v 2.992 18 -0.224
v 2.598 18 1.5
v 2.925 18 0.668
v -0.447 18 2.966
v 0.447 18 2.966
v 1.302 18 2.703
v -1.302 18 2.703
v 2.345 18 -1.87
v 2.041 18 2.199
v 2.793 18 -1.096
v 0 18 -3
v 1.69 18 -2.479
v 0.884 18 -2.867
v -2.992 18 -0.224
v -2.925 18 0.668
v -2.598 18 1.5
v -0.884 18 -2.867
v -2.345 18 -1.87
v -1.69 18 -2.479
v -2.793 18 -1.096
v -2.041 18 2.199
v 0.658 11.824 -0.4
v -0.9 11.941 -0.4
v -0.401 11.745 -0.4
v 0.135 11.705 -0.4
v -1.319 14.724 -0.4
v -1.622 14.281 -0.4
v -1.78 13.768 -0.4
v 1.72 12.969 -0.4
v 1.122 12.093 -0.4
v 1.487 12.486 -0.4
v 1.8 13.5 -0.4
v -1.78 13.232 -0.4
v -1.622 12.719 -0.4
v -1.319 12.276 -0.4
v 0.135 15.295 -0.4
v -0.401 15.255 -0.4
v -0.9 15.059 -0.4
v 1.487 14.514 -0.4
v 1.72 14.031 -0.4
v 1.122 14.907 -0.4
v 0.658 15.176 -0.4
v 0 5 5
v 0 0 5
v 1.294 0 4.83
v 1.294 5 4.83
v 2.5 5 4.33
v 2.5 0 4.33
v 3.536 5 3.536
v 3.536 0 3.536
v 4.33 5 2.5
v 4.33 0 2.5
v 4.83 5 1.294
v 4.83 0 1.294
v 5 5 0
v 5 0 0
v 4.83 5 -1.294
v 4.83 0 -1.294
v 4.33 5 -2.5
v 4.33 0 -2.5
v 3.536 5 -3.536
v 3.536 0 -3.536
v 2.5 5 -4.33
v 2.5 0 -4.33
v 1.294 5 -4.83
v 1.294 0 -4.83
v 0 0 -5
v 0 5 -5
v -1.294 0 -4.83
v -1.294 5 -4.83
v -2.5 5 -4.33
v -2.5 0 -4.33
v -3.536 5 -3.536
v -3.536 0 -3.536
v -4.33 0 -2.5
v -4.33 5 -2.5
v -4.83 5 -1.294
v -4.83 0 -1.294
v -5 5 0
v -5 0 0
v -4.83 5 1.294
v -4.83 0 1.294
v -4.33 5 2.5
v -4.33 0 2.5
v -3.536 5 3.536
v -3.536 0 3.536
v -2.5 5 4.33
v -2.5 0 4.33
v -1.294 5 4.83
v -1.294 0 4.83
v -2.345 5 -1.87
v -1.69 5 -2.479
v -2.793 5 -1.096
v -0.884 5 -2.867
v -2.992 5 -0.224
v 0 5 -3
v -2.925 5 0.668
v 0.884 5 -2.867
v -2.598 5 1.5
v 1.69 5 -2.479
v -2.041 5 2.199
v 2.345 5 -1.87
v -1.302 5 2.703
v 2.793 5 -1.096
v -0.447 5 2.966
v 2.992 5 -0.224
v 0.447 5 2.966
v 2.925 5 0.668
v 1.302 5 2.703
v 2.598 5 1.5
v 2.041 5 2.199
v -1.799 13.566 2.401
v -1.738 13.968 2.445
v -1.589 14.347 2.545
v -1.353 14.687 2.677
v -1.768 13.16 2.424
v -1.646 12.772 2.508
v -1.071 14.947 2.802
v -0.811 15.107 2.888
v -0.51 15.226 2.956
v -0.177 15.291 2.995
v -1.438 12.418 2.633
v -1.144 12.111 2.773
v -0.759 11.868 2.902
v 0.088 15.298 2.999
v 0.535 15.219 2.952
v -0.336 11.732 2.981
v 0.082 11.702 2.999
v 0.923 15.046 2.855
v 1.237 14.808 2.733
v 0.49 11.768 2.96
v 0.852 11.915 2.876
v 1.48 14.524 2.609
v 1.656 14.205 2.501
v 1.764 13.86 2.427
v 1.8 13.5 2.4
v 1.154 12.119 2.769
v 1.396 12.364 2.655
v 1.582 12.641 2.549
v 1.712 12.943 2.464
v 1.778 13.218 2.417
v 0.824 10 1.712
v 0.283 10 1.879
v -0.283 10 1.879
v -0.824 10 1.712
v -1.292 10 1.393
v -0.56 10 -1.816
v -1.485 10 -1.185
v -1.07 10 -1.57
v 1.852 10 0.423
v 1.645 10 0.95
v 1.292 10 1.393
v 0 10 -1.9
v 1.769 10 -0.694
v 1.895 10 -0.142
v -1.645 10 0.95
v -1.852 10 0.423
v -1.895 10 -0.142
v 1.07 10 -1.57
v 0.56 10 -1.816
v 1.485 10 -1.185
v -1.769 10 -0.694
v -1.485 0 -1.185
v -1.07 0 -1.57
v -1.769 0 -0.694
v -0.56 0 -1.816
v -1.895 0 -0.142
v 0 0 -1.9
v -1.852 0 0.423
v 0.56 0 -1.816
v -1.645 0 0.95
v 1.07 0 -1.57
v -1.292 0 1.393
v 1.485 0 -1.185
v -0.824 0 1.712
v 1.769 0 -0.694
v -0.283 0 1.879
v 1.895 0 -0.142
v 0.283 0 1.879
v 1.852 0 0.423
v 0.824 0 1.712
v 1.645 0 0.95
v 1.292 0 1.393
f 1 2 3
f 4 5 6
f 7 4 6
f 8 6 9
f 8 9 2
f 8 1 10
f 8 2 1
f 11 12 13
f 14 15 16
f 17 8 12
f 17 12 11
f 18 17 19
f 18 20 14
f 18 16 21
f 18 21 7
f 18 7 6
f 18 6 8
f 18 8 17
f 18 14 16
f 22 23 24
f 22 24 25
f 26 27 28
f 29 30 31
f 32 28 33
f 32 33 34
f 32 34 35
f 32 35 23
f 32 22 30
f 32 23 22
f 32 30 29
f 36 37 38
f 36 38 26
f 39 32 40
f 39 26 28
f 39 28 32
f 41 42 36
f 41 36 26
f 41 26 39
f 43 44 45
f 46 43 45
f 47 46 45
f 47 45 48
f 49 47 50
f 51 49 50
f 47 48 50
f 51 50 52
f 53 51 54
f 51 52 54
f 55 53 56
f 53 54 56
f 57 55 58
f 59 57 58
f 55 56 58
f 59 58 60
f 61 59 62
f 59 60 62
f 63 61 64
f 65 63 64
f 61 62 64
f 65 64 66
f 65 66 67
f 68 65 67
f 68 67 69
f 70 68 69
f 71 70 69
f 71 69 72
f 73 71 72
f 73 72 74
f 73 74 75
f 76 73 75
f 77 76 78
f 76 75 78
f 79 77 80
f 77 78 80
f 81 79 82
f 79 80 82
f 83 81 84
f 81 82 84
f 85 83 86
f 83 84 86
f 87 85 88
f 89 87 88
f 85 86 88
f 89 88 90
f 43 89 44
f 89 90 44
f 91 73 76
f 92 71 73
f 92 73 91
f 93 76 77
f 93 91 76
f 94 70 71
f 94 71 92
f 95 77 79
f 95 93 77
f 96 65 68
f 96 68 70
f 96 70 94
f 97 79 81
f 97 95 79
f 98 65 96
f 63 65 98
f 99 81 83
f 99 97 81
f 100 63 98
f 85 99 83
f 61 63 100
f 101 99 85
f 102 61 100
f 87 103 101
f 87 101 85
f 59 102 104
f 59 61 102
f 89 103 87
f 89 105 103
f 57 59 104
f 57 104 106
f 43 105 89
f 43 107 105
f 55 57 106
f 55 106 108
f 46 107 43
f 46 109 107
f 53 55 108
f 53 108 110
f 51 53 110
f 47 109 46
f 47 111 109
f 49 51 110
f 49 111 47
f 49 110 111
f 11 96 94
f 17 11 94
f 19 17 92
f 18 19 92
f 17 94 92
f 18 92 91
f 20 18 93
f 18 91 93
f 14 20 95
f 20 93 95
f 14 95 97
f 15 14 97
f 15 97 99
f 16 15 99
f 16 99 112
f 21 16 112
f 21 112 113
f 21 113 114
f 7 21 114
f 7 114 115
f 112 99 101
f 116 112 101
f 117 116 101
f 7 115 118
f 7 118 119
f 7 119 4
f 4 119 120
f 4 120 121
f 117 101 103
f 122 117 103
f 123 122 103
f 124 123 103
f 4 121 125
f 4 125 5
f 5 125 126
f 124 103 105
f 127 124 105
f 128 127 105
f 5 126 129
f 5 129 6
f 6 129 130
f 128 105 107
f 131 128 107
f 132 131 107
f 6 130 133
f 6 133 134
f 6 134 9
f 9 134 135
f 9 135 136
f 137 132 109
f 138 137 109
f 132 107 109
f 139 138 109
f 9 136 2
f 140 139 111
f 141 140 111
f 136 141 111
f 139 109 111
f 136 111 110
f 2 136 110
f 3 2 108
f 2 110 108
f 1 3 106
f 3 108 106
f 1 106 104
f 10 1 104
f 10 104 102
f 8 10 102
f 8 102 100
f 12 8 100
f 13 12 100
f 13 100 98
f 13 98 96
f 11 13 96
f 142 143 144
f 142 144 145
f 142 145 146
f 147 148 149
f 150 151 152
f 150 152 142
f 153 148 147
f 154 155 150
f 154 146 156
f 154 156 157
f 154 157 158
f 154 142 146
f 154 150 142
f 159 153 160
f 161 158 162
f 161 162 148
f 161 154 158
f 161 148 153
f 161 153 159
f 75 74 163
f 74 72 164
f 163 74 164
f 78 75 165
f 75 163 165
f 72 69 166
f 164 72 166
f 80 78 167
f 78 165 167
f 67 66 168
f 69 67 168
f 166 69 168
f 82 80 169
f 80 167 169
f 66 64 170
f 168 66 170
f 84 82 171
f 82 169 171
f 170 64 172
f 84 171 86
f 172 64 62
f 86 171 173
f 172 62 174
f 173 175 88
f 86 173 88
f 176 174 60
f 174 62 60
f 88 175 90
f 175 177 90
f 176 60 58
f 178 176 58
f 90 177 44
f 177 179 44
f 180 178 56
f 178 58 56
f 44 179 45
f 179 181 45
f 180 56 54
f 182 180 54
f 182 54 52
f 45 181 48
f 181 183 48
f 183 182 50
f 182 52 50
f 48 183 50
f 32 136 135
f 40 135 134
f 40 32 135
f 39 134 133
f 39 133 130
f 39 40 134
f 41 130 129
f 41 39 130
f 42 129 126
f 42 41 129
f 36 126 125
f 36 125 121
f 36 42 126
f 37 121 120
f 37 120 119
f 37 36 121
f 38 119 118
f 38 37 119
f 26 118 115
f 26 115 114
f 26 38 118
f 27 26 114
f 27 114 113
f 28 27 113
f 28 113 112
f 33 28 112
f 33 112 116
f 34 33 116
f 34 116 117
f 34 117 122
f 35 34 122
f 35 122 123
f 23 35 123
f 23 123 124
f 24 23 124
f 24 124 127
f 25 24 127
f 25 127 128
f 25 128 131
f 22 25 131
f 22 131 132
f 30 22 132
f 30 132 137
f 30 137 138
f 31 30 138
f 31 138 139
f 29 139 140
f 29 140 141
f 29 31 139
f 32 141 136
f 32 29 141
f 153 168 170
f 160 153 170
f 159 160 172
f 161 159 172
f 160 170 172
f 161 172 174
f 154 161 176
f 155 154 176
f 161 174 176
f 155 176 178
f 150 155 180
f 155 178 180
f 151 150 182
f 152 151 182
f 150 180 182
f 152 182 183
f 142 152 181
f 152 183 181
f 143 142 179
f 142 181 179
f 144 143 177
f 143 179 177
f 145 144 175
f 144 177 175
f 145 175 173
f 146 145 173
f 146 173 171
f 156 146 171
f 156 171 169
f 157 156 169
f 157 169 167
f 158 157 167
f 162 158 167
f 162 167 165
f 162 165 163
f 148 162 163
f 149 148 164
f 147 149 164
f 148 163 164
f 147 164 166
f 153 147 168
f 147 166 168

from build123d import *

# Parameters (mm, degrees)
SKETCH1_R               = 5
BOSS_EXTRUDE1_DEPTH     = 5
SKETCH2_R               = 3
BOSS_EXTRUDE2_DEPTH     = 13
SKETCH3_R               = 1.9
CUT_EXTRUDE1_DEPTH      = 10
CUT_EXTRUDE5_DEPTH      = 20.339079606
CUT_EXTRUDE5_DEPTH_BACK = 0.4
SKETCH7_R               = 1.8


with BuildPart() as part:
    # Sketch1 → Boss-Extrude1 (new body)
    with BuildSketch(Plane(origin=(0, 0, 0), x_dir=(1, 0, 0), z_dir=(0, 1, 0))):
        Circle(SKETCH1_R)
    extrude(amount=BOSS_EXTRUDE1_DEPTH)

    # Sketch2 → Boss-Extrude2 (add)
    with BuildSketch(Plane(origin=(0, 5, 0), x_dir=(1, 0, 0), z_dir=(0, 1, 0))):
        Circle(SKETCH2_R)
    extrude(amount=BOSS_EXTRUDE2_DEPTH)

    # Sketch3 → Cut-Extrude1 (cut)
    with BuildSketch(Plane.XZ):
        Circle(SKETCH3_R)
    extrude(amount=-CUT_EXTRUDE1_DEPTH, mode=Mode.SUBTRACT)

    # Sketch7 → Cut-Extrude5 (cut, two sides: drawn at the far end of the back side and taken through both)
    with BuildSketch(Plane.XY.offset(-CUT_EXTRUDE5_DEPTH_BACK)):
        with Locations((0, 13.5)):
            Circle(SKETCH7_R)
    extrude(amount=CUT_EXTRUDE5_DEPTH + CUT_EXTRUDE5_DEPTH_BACK, mode=Mode.SUBTRACT)


solid = part.part
